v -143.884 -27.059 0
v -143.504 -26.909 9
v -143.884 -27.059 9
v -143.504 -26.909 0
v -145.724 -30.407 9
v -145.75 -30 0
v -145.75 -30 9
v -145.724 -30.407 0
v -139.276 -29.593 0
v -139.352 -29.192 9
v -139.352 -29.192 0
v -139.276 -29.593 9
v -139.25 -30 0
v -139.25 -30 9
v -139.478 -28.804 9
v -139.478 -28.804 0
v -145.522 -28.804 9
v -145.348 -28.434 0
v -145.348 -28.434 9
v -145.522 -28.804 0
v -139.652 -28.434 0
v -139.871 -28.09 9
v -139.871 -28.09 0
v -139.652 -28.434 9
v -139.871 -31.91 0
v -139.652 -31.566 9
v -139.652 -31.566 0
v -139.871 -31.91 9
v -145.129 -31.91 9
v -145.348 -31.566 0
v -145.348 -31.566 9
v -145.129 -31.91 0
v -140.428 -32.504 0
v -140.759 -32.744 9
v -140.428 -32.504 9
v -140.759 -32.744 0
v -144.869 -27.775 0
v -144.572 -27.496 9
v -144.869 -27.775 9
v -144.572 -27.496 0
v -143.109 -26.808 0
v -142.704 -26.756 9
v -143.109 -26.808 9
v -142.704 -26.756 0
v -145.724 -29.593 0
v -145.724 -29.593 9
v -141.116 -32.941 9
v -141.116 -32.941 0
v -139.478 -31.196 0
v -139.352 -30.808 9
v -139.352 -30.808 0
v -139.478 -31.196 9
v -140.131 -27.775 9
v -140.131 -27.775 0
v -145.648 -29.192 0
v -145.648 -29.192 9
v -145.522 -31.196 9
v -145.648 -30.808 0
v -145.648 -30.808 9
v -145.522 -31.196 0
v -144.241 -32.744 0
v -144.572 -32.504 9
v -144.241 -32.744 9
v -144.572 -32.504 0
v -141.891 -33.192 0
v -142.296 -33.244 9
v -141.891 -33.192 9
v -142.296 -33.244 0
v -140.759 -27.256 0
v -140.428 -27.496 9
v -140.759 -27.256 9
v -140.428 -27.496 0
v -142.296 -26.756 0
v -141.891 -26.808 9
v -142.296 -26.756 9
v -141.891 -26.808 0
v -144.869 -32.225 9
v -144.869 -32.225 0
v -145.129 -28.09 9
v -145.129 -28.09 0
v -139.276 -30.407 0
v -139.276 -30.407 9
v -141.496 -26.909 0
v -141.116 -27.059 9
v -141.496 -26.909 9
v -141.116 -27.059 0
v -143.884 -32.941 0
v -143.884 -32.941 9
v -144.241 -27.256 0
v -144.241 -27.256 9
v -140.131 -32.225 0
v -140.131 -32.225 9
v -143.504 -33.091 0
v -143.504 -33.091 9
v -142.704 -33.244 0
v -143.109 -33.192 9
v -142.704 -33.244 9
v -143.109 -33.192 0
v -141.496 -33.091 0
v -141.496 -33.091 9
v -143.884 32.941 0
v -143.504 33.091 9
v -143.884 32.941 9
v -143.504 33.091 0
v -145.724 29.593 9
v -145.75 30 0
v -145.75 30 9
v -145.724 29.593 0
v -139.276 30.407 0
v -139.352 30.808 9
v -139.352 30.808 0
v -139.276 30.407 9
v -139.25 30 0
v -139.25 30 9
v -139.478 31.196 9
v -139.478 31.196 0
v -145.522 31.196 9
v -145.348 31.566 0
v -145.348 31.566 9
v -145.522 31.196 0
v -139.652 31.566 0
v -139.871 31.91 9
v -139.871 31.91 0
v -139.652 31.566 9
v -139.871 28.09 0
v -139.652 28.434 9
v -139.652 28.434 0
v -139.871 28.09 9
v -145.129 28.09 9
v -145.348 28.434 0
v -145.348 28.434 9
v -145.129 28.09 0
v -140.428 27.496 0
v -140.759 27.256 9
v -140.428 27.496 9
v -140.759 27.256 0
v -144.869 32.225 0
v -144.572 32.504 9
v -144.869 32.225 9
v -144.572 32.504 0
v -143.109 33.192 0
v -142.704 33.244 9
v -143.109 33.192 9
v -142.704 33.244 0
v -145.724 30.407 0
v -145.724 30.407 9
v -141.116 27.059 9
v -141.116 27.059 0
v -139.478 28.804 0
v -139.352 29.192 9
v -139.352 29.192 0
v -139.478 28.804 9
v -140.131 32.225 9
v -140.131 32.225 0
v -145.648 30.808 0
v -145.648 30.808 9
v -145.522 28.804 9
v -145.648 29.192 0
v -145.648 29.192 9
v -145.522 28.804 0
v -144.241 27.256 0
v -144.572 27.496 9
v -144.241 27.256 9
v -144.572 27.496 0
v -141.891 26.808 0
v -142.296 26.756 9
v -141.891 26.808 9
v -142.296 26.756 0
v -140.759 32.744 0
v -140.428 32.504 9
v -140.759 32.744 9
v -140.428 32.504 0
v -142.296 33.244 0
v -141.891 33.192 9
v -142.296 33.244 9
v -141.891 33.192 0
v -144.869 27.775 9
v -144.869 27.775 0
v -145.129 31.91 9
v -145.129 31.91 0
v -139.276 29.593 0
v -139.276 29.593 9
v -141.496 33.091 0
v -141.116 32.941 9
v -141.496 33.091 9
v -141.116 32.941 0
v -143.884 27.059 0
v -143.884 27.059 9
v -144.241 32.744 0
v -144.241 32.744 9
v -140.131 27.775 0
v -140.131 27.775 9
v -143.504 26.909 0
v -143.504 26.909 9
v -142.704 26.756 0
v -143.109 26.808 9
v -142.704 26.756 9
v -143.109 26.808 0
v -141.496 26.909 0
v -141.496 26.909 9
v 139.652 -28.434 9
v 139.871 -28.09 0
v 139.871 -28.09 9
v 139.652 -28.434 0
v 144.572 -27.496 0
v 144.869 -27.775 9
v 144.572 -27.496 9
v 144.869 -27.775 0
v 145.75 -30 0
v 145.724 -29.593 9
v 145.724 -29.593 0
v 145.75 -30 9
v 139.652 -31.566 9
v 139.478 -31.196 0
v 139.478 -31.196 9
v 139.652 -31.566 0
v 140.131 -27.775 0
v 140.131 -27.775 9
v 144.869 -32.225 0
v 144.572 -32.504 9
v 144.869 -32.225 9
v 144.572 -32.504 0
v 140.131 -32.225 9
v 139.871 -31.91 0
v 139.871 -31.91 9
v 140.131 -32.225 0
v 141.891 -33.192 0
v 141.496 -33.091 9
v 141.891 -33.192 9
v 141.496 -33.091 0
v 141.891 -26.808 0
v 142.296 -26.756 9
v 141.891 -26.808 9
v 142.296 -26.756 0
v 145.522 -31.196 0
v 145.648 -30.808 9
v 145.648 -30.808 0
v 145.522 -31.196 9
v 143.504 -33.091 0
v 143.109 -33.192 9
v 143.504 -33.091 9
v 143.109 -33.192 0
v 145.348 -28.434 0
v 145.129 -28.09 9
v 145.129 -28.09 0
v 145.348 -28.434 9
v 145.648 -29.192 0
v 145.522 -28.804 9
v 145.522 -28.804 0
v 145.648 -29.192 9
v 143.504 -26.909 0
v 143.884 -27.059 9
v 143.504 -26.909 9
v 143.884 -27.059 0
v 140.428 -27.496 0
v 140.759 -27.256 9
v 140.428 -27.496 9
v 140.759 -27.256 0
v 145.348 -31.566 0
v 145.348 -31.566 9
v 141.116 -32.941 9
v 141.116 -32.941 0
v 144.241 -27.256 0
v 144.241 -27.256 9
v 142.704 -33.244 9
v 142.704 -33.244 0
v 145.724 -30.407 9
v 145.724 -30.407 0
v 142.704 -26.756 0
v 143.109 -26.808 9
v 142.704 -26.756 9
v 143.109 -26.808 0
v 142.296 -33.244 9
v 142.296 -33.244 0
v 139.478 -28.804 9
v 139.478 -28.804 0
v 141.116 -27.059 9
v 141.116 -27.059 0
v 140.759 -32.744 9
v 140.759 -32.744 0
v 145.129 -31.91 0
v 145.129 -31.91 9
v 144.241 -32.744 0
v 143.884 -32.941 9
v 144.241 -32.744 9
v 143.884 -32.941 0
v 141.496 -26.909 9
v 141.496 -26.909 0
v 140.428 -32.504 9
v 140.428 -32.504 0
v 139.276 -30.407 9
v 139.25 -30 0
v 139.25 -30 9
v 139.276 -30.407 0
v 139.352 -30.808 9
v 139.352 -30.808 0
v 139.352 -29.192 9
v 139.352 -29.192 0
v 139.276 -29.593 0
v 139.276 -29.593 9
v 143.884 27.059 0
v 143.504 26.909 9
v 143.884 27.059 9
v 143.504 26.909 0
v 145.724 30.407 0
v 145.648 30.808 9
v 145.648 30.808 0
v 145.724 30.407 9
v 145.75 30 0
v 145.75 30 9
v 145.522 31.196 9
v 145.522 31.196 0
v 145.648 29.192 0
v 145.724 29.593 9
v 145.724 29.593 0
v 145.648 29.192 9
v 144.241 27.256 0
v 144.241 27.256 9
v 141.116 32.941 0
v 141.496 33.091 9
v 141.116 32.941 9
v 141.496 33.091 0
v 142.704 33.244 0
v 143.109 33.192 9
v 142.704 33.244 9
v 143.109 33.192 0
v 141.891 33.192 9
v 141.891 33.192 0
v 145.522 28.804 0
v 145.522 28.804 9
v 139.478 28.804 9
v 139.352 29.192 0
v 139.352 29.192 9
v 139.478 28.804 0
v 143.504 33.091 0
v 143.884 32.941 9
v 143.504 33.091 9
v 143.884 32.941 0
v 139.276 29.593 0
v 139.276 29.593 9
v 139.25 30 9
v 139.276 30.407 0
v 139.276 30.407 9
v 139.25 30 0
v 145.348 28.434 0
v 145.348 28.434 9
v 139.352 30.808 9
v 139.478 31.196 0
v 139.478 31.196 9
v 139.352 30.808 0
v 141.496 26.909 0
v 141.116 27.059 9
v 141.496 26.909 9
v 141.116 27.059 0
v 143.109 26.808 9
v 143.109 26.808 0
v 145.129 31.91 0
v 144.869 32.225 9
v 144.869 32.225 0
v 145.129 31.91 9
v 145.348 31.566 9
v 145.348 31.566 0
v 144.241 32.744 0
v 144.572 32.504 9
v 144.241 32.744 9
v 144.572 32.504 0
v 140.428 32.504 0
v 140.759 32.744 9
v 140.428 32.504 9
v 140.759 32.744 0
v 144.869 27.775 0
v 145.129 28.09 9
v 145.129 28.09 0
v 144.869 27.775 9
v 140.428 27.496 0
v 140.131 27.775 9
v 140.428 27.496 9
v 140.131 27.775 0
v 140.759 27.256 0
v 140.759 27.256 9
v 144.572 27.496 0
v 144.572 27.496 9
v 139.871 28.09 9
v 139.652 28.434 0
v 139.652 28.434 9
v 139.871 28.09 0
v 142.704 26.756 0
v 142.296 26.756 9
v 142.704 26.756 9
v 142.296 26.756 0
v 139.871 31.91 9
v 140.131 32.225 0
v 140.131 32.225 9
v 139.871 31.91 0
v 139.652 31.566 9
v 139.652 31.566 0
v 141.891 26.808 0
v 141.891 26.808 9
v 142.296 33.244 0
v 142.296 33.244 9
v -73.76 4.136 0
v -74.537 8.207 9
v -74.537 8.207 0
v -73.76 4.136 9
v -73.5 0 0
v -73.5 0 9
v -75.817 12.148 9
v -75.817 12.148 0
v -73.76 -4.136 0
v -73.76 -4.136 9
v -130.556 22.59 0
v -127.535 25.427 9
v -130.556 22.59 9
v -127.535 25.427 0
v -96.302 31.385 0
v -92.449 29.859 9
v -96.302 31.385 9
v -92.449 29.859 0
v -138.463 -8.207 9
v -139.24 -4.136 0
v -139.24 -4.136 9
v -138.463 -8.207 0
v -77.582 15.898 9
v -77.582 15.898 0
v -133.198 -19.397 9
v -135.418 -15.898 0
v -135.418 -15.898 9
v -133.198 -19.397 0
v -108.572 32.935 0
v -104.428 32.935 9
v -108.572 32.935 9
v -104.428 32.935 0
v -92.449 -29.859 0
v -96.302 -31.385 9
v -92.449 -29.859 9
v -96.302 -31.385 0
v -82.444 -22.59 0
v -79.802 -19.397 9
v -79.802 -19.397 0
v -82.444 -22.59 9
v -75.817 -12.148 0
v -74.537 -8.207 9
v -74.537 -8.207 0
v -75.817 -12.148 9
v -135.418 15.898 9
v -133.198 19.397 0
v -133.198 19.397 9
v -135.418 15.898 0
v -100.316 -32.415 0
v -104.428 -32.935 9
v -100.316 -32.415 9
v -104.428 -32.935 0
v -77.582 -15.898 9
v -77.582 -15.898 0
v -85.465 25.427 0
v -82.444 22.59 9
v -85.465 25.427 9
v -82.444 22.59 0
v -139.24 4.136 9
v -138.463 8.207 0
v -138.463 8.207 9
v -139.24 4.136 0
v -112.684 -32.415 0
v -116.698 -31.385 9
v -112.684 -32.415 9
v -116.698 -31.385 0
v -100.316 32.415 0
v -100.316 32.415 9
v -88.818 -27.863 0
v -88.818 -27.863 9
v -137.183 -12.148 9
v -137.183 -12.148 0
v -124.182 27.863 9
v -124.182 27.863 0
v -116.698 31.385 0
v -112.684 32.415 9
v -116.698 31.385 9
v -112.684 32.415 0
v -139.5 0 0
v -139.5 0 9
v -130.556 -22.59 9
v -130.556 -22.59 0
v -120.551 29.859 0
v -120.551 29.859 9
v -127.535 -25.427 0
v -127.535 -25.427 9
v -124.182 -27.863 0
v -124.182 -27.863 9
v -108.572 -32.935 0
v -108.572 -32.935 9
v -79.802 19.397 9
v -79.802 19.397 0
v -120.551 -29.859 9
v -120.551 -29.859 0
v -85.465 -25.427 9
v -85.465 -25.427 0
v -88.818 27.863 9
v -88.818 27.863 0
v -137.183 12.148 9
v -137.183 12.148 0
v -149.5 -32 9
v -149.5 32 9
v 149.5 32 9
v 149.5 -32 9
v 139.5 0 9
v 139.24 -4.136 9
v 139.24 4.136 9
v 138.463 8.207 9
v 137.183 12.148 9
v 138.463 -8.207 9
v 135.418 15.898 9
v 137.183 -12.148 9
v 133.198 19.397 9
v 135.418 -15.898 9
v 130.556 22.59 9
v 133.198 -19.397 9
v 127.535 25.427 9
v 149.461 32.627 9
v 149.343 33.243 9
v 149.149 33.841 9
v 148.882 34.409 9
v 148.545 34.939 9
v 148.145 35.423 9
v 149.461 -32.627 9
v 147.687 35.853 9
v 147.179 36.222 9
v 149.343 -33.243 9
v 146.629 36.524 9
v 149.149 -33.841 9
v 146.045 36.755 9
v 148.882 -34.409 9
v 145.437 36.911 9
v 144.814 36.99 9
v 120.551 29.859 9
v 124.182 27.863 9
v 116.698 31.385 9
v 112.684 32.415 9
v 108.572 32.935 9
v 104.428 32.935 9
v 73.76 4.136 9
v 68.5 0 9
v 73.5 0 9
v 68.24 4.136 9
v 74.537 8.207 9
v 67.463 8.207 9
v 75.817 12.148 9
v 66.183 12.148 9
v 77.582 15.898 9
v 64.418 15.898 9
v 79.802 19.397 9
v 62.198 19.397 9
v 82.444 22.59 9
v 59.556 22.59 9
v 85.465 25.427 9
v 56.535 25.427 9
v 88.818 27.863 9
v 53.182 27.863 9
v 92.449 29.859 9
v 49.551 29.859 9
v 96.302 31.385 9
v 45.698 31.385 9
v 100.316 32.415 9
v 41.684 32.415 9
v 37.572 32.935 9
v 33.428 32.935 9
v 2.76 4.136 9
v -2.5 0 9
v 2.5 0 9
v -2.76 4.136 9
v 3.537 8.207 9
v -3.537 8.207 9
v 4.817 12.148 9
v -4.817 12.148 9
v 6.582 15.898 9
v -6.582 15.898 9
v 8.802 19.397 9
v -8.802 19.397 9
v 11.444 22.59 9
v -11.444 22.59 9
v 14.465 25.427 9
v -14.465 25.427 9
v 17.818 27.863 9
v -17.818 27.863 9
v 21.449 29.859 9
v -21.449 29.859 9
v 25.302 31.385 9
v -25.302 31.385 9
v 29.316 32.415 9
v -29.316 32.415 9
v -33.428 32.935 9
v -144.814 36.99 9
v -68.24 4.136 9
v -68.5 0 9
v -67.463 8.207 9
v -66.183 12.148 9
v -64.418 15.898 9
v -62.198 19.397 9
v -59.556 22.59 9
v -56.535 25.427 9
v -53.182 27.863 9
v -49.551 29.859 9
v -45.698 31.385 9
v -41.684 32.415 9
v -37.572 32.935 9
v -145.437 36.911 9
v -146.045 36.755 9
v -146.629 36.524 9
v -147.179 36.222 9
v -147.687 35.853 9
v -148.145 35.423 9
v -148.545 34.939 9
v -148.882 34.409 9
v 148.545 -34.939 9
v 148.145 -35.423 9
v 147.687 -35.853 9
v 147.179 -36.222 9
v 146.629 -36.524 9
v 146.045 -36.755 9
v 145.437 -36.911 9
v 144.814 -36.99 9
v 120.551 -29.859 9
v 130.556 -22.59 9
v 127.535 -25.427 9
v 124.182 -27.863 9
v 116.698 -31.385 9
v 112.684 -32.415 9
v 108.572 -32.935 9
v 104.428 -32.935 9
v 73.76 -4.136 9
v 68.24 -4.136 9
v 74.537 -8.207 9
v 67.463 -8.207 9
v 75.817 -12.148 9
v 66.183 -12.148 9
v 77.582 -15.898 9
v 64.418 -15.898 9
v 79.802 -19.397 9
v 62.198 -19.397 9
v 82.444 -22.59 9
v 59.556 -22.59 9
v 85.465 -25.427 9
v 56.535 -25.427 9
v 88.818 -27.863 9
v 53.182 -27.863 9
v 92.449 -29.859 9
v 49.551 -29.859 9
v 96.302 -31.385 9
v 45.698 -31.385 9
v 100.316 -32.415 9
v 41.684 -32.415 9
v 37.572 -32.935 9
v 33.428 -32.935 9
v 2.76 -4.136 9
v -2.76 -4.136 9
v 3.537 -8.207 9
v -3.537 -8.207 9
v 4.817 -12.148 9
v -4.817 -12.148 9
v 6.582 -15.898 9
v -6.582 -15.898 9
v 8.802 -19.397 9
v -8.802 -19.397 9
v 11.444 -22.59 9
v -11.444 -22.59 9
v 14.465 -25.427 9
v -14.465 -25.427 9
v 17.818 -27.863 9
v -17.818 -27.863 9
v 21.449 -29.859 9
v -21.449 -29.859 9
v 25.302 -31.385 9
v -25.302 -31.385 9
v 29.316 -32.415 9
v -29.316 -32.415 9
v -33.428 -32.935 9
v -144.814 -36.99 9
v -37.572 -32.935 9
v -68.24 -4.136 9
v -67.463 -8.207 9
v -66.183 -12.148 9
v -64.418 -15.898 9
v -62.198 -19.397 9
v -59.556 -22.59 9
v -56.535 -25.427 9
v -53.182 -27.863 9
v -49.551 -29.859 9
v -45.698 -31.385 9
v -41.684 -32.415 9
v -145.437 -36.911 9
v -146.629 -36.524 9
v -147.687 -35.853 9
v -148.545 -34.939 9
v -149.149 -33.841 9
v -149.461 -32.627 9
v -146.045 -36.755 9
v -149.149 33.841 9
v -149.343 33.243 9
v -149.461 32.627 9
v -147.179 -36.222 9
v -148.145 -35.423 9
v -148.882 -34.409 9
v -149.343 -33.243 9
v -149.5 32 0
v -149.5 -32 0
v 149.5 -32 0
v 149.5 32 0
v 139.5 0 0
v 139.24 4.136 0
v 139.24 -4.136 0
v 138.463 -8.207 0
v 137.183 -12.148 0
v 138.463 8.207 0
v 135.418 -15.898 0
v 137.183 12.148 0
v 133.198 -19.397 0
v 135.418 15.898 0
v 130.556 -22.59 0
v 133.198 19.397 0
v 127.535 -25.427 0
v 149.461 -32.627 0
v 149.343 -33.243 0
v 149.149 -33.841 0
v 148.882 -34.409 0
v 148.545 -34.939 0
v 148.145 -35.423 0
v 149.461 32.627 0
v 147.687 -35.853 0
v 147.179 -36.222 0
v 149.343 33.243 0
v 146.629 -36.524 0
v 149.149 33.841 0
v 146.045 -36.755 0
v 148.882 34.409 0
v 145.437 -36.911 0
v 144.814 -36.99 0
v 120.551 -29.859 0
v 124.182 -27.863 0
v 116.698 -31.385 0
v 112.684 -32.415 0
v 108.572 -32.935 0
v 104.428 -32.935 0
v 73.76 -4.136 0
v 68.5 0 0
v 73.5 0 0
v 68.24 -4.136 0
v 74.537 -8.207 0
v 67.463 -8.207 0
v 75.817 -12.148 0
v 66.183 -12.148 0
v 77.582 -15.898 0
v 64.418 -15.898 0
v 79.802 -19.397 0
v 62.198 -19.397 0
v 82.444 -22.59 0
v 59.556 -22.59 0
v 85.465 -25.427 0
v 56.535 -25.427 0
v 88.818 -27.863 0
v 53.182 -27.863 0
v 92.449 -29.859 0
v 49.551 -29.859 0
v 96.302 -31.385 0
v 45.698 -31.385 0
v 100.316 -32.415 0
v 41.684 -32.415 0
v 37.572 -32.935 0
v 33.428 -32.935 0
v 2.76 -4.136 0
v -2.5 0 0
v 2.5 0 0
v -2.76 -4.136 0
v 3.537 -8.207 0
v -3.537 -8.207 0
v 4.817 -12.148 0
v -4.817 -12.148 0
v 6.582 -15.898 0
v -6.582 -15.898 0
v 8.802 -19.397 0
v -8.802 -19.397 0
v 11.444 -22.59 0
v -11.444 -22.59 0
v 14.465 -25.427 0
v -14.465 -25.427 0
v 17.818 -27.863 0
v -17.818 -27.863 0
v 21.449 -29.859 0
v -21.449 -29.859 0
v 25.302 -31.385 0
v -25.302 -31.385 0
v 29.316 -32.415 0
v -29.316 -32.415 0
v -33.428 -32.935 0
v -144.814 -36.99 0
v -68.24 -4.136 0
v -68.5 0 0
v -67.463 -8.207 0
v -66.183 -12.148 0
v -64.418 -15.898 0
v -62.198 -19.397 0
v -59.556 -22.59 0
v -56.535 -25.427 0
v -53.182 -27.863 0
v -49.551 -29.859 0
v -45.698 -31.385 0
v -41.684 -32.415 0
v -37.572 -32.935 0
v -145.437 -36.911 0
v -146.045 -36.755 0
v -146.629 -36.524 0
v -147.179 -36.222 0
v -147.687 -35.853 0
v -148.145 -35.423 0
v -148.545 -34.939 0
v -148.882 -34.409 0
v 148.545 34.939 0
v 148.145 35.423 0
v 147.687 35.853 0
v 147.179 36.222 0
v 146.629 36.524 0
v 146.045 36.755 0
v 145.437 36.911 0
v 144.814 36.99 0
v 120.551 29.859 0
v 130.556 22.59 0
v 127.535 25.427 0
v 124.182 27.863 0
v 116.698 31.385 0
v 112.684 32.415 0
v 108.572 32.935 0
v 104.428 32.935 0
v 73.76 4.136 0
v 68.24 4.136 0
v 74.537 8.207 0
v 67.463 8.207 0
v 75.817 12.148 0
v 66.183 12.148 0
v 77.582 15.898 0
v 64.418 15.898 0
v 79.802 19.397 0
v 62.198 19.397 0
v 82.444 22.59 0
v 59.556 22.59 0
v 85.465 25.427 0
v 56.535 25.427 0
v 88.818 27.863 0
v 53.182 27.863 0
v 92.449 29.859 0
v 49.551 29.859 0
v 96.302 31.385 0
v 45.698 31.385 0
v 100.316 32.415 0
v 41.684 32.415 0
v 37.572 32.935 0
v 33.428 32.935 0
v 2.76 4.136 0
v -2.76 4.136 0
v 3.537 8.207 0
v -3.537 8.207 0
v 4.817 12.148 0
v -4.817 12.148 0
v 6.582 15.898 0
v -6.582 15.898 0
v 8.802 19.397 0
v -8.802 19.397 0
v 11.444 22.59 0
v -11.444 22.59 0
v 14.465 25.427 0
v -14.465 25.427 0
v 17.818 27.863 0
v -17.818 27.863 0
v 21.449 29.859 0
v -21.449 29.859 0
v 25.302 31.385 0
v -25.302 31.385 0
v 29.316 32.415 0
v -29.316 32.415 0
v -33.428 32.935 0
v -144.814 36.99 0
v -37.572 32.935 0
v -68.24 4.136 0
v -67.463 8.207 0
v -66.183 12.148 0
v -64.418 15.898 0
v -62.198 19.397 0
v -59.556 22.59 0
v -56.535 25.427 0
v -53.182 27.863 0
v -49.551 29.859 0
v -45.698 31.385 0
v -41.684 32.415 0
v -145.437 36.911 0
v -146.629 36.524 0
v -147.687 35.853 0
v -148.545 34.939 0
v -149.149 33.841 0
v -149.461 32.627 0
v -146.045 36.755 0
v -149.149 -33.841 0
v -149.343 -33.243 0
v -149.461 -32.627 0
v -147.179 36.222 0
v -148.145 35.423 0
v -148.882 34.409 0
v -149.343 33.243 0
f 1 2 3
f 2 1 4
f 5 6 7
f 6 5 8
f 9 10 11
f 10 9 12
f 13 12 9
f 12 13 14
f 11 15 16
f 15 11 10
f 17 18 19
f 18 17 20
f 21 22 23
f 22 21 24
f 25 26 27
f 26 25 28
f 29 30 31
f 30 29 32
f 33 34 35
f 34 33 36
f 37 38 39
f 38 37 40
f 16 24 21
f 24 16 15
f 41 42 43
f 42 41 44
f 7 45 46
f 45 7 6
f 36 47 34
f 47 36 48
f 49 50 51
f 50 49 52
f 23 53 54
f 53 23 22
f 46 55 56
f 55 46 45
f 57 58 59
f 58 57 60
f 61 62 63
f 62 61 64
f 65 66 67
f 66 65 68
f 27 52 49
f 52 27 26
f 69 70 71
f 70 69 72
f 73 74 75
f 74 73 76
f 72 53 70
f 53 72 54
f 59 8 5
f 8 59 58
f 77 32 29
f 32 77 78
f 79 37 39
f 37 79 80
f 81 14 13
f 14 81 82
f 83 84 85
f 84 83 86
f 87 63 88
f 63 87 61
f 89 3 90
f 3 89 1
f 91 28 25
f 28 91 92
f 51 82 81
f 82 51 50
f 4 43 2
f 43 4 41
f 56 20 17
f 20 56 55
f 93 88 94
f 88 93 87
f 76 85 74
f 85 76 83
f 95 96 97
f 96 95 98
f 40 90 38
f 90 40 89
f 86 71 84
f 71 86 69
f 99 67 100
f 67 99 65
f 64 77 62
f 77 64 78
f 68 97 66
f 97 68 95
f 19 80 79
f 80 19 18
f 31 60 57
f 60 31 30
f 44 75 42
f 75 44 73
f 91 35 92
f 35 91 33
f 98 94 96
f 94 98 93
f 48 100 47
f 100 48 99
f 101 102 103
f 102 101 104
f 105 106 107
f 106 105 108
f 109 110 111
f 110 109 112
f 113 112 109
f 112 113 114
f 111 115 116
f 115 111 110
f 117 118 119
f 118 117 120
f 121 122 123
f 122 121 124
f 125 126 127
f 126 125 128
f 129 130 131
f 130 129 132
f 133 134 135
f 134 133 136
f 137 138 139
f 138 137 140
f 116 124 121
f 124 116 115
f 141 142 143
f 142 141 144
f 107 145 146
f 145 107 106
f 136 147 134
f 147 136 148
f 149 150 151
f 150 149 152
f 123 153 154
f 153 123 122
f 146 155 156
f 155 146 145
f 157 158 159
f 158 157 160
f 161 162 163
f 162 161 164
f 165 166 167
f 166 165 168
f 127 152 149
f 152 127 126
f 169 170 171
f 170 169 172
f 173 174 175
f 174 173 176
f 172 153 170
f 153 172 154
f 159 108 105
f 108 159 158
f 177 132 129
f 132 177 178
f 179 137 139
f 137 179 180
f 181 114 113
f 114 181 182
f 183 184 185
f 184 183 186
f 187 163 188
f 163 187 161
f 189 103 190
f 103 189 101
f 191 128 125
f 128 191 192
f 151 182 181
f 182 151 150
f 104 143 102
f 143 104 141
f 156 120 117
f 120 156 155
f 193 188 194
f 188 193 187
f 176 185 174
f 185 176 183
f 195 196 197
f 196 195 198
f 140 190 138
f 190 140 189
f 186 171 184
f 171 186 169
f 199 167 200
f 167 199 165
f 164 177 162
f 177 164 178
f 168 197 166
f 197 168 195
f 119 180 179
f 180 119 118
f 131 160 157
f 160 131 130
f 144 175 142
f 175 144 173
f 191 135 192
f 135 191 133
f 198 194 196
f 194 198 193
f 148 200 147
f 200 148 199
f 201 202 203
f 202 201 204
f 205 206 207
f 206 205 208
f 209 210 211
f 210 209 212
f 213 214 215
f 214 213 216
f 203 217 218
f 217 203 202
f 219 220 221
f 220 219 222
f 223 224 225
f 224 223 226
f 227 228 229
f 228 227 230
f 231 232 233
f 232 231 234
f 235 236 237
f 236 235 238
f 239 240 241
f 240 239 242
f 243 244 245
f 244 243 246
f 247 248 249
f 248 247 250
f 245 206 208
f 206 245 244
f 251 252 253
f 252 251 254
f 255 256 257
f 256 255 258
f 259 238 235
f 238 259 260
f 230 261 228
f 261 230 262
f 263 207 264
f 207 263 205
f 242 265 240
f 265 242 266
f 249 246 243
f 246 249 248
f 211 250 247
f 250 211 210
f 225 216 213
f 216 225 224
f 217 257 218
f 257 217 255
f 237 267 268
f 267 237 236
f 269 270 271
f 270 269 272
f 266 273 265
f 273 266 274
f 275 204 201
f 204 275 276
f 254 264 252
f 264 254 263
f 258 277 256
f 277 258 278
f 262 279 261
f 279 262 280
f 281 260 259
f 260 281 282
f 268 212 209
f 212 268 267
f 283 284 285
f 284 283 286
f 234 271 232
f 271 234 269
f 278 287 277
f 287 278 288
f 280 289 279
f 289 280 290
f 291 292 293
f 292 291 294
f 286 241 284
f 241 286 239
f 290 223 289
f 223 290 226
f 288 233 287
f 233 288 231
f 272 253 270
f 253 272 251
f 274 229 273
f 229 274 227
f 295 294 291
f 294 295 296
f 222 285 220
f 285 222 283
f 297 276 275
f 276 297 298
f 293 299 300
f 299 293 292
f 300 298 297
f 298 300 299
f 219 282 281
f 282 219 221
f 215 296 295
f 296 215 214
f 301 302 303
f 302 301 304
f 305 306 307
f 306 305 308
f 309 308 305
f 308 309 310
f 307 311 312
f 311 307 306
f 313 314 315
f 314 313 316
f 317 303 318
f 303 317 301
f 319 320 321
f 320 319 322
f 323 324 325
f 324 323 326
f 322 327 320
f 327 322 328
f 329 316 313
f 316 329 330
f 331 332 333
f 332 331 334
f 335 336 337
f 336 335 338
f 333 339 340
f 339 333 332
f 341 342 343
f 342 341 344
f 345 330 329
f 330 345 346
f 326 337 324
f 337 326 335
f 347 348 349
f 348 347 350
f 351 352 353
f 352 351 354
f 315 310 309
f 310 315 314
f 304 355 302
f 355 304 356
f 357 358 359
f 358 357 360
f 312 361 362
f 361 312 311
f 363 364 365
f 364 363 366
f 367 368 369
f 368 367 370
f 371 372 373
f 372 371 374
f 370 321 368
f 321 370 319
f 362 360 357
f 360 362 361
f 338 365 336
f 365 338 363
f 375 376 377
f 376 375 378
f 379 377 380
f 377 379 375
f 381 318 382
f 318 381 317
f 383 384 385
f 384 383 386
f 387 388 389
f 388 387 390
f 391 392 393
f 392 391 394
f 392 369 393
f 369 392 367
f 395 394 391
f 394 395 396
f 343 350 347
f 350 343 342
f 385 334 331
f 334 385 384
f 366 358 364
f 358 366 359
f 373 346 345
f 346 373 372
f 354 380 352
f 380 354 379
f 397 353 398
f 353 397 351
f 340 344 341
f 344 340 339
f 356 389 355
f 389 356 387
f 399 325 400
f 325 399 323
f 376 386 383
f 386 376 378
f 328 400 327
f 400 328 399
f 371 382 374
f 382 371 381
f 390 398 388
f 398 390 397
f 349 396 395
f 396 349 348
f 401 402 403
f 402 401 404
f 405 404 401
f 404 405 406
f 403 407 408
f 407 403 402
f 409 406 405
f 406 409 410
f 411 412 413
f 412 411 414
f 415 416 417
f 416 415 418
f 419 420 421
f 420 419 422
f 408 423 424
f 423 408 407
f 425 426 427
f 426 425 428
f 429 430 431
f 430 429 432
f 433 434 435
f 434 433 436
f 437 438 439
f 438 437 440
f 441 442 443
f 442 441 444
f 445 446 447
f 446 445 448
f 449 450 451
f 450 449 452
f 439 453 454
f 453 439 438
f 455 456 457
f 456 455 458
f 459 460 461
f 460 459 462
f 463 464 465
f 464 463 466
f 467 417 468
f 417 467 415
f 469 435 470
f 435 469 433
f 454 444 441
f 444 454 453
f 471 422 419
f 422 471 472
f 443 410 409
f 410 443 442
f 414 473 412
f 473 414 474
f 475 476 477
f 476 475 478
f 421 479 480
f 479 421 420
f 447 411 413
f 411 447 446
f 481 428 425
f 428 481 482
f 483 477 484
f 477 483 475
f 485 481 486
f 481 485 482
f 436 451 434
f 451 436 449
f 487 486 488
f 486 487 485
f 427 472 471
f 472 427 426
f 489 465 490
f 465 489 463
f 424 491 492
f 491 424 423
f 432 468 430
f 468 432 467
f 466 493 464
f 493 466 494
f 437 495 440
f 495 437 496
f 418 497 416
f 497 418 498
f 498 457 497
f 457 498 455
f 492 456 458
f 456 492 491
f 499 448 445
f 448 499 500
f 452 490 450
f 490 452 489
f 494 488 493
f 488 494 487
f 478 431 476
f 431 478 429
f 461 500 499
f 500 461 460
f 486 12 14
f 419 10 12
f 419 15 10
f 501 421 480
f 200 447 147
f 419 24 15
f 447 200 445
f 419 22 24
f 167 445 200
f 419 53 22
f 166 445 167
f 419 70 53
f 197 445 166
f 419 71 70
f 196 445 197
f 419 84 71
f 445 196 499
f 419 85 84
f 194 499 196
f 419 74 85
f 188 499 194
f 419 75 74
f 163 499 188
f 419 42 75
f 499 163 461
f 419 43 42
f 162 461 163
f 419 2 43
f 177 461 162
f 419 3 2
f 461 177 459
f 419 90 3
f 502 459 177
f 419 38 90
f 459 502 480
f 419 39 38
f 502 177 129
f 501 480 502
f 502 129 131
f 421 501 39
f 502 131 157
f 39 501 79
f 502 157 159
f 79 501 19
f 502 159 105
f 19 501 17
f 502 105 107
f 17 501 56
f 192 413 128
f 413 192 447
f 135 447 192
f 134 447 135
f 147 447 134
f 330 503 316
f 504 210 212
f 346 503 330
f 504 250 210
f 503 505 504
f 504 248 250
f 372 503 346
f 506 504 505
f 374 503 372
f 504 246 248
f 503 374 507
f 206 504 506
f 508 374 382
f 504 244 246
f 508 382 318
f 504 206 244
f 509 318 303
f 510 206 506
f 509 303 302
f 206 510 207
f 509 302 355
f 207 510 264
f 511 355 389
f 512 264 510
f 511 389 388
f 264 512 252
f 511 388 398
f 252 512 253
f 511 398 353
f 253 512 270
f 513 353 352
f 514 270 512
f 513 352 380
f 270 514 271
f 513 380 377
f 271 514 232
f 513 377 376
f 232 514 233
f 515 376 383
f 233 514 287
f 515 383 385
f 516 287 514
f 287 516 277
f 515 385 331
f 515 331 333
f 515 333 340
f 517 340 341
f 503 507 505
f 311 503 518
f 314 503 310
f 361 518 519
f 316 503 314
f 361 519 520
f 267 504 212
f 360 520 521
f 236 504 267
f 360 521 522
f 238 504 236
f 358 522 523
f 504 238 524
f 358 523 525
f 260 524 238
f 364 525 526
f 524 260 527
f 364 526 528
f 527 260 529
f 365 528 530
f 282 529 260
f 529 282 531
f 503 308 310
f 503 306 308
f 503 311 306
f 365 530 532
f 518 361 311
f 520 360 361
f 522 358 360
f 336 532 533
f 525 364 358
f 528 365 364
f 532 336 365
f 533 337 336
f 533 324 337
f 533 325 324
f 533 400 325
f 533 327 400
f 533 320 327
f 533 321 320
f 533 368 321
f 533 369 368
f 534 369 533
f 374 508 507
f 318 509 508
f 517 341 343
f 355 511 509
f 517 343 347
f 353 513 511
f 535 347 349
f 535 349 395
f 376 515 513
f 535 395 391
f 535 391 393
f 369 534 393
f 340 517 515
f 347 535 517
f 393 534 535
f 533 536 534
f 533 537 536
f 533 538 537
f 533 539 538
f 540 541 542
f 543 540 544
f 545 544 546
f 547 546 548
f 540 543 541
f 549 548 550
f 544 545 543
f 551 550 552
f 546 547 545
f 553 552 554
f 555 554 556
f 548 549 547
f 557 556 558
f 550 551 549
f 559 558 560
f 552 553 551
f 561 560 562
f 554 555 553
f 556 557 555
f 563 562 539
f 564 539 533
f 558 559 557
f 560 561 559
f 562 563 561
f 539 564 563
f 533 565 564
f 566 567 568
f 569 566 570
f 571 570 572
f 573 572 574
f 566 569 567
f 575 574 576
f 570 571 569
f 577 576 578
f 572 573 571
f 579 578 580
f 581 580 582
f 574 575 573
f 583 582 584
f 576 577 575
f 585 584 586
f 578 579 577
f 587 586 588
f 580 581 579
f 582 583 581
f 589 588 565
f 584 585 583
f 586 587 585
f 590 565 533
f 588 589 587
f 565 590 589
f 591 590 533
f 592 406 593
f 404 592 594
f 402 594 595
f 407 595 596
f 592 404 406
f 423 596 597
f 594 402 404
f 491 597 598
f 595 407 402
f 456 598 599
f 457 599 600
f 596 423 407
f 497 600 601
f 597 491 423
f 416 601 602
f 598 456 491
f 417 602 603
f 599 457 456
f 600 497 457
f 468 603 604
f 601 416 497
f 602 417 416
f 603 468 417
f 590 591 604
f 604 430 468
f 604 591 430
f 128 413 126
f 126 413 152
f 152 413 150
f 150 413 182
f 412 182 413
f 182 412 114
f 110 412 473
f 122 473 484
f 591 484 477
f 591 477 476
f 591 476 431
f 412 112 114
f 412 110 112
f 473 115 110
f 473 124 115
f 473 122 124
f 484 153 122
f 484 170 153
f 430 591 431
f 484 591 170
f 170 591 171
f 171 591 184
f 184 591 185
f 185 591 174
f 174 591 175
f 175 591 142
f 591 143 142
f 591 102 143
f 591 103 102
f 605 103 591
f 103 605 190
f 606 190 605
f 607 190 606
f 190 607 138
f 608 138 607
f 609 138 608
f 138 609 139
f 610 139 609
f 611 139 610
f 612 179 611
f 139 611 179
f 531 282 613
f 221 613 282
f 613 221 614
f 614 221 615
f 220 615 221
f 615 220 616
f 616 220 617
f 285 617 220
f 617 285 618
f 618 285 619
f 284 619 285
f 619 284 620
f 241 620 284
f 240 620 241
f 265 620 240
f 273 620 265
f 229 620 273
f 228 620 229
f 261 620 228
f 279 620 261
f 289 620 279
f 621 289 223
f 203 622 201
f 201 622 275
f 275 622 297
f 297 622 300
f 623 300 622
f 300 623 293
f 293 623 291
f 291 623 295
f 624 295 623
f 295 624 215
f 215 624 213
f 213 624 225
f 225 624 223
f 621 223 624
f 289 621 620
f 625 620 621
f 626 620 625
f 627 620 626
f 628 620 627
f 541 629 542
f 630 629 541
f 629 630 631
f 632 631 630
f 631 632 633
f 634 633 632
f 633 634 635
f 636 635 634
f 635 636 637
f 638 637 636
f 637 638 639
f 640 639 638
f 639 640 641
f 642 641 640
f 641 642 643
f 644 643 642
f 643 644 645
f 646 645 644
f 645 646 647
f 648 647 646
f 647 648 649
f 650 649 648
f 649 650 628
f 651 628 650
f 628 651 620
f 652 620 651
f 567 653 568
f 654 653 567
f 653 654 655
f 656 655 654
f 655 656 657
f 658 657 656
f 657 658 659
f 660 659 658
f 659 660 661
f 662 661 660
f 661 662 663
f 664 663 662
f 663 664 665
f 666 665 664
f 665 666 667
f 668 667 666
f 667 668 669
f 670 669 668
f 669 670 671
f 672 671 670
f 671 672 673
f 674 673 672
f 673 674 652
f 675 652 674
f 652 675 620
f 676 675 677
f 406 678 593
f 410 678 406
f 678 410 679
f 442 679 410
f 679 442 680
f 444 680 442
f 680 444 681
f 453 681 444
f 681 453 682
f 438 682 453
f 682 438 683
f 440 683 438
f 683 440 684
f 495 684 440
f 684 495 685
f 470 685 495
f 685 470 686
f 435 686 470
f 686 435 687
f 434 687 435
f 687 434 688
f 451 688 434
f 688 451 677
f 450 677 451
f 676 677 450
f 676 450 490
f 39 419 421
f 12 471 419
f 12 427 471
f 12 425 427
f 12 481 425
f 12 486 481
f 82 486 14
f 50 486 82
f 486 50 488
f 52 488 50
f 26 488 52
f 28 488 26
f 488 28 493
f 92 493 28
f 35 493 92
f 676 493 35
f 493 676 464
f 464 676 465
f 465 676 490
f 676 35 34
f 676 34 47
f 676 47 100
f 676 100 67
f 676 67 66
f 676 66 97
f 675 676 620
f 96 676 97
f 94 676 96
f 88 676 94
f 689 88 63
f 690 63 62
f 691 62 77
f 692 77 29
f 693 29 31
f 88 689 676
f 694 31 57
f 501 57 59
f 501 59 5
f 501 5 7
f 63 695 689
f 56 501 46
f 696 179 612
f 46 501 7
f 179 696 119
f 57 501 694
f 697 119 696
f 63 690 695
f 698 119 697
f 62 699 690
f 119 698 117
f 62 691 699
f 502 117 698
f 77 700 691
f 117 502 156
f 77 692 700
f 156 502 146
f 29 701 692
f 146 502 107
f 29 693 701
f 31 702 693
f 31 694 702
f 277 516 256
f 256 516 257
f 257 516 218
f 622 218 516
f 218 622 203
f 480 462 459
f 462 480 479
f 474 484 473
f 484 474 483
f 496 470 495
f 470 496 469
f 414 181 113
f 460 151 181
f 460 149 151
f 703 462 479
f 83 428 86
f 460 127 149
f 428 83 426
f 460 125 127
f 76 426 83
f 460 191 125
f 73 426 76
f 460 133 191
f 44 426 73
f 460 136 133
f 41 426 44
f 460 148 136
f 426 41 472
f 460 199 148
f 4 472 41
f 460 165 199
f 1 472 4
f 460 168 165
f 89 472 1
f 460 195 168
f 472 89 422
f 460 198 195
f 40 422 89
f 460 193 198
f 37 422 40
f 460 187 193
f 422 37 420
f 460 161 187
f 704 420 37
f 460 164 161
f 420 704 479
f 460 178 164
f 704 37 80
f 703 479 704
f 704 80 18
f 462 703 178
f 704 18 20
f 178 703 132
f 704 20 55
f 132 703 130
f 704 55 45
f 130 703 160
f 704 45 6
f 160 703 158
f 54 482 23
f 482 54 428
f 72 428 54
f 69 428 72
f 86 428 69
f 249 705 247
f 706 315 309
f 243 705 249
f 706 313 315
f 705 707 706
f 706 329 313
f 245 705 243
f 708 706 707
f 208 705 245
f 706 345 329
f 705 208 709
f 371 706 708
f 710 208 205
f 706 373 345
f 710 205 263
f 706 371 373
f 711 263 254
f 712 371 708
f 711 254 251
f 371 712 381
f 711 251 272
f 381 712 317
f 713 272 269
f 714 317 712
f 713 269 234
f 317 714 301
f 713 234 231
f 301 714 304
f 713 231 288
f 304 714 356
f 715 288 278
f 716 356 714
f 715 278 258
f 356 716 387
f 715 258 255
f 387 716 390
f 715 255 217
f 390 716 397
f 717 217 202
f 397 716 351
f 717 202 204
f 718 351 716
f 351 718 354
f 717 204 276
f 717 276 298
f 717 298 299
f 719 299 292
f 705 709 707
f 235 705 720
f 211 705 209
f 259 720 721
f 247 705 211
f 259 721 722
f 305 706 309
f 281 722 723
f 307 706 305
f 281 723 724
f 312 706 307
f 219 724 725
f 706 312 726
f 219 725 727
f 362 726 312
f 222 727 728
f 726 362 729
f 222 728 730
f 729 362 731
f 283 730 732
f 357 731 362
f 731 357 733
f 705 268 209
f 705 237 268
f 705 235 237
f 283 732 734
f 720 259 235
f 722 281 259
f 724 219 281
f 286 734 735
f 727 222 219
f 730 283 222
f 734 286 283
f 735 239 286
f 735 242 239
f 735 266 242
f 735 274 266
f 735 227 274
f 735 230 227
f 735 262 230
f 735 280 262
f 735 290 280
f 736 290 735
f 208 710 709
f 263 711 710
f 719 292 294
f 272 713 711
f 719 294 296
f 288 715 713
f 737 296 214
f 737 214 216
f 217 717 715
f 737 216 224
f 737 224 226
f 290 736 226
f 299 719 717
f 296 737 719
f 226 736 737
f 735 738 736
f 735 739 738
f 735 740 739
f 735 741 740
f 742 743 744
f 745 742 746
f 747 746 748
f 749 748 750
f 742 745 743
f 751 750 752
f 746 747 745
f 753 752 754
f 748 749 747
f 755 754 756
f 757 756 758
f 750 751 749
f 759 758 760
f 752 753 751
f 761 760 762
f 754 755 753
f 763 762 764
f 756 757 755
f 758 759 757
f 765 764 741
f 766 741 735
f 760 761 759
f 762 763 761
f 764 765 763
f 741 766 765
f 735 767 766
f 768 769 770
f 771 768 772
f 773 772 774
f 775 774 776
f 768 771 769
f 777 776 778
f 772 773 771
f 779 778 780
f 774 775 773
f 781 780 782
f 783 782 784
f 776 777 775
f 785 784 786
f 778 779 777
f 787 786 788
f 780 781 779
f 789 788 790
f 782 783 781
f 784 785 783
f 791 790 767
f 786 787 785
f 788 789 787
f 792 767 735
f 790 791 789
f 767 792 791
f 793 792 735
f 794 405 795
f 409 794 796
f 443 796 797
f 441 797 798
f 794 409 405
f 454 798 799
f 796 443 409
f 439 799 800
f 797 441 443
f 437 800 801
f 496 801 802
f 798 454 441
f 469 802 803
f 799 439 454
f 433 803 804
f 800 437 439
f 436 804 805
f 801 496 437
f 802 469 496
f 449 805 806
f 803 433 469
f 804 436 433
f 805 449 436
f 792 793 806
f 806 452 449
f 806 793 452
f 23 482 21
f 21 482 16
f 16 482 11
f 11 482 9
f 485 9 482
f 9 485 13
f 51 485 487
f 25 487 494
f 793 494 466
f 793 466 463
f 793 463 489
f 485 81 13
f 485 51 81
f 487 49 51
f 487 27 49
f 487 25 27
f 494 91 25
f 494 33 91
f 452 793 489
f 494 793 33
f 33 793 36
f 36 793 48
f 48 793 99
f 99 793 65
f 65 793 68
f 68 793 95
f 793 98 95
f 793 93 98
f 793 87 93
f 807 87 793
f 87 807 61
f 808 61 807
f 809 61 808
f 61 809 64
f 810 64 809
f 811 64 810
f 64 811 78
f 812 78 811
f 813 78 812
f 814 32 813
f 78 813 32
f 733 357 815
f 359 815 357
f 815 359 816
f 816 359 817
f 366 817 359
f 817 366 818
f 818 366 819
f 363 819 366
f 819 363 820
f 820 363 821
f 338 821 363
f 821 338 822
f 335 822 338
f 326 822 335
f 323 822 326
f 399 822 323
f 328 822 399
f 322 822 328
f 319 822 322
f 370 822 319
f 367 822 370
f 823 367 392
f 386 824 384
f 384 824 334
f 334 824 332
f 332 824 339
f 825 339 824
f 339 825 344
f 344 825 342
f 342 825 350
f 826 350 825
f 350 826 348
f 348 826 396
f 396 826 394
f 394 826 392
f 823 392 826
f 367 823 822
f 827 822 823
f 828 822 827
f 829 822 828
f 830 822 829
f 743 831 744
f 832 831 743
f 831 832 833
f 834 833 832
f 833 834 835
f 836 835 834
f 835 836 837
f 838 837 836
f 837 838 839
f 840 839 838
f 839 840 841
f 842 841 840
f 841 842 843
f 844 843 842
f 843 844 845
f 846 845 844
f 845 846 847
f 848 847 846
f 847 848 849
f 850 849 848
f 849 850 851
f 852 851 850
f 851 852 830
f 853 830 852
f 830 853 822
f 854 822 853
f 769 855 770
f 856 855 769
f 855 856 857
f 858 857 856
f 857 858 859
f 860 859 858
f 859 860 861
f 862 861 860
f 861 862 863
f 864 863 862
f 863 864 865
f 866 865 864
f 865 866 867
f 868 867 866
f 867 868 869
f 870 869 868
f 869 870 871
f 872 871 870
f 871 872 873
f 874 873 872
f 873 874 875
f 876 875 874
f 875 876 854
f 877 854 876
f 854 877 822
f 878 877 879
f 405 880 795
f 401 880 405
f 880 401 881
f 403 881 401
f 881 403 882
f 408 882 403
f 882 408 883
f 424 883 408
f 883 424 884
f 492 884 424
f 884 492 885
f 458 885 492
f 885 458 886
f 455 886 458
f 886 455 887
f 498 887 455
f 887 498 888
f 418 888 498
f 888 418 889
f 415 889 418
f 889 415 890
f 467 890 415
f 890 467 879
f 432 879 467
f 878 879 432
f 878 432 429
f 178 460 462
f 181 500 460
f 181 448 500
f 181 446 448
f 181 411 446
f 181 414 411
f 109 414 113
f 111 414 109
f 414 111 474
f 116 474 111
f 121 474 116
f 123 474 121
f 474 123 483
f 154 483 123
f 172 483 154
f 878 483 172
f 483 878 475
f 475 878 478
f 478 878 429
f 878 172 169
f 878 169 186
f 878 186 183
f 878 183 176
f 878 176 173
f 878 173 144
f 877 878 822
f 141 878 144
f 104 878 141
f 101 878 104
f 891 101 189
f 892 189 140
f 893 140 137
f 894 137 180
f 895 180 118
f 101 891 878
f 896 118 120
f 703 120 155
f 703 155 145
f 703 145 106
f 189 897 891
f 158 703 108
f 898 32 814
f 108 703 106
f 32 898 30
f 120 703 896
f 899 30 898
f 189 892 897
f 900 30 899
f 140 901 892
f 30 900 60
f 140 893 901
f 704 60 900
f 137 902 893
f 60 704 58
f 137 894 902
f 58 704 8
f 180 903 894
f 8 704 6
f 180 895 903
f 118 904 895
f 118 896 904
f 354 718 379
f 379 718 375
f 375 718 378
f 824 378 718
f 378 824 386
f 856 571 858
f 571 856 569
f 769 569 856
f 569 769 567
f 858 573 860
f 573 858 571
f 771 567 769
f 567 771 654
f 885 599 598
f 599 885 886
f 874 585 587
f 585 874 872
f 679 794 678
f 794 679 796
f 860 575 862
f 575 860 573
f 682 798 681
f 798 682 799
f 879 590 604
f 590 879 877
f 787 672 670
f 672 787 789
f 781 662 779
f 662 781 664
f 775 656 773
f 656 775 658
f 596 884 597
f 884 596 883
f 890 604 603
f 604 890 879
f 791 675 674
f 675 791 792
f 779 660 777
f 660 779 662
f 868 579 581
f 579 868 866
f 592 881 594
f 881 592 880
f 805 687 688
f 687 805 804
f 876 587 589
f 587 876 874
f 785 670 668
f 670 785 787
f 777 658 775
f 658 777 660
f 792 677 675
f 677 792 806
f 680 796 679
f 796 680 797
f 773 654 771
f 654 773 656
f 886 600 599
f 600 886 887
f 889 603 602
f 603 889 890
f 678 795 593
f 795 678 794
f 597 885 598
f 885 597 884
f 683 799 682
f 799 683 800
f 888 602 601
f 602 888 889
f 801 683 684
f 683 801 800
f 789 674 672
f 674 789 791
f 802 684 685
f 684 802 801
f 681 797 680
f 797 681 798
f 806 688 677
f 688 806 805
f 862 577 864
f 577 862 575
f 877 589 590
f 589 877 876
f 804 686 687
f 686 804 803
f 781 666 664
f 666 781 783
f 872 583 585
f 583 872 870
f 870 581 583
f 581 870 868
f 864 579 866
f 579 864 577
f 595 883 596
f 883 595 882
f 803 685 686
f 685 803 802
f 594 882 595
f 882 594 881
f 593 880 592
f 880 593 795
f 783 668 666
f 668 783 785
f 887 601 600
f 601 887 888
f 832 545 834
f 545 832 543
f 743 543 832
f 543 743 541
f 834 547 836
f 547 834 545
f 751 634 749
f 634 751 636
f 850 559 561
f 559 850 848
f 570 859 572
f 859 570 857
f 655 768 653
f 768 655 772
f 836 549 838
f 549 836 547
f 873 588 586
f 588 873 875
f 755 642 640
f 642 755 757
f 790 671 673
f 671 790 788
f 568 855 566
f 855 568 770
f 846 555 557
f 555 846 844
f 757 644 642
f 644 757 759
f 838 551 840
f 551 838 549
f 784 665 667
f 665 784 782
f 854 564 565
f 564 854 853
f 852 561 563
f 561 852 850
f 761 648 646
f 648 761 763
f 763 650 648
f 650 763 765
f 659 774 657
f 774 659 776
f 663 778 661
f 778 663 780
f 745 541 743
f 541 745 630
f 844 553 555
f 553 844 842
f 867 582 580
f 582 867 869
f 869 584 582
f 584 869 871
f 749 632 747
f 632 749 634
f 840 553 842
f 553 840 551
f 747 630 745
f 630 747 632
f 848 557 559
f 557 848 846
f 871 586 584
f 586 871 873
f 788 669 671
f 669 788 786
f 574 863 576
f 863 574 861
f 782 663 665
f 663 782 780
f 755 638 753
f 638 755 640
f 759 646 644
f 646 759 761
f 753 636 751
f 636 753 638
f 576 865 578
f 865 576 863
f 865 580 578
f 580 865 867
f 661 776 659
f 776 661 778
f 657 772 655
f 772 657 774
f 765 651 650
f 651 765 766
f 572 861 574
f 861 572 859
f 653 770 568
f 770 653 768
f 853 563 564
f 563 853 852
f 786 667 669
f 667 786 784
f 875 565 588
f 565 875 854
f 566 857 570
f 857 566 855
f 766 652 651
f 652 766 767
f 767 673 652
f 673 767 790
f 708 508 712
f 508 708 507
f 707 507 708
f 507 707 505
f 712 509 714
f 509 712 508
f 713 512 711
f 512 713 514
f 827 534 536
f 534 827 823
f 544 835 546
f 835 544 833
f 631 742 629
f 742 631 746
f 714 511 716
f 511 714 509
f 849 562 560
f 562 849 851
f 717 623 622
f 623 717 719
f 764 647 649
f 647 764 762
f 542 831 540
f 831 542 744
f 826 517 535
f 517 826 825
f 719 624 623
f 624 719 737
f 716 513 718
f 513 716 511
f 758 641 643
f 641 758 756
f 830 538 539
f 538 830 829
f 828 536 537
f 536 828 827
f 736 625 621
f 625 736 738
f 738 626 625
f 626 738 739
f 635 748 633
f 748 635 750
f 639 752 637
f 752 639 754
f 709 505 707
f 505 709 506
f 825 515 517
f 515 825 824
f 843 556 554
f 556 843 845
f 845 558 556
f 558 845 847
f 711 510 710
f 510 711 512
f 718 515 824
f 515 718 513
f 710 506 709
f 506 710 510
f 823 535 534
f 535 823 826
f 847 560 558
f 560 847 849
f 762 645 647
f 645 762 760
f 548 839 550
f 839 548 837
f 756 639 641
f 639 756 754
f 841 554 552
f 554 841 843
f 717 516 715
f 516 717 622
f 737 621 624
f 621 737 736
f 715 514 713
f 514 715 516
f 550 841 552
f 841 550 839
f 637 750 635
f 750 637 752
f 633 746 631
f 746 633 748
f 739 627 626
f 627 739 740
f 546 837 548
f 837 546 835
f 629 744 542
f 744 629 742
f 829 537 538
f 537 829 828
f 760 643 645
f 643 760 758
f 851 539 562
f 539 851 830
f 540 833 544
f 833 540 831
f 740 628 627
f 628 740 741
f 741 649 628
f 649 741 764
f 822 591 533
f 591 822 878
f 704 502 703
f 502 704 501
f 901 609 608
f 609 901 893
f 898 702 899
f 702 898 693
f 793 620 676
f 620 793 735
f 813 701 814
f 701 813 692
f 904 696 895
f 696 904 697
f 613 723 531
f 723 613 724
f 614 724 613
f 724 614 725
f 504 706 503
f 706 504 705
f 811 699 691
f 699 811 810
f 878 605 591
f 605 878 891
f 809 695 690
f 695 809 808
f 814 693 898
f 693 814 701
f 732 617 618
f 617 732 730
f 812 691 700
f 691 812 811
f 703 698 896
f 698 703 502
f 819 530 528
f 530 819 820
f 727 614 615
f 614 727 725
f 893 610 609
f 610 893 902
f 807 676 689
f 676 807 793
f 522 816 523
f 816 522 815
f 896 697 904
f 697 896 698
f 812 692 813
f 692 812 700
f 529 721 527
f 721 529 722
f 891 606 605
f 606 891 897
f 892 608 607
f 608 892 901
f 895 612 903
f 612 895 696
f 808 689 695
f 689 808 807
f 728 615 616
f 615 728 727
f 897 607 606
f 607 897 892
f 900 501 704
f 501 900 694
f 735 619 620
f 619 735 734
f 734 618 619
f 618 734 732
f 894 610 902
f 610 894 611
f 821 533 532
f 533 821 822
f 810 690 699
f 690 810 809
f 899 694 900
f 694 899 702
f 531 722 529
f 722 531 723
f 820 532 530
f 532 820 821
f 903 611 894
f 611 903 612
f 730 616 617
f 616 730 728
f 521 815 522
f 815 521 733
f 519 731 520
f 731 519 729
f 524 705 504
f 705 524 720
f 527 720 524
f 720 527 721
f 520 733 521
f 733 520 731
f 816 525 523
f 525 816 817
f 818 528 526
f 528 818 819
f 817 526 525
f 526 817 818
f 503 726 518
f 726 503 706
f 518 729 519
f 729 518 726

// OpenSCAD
$fn = 50;


difference() {
	union() {
		hull() {
			translate(v = [-144.5000000000, 32.0000000000, 0]) {
				cylinder(h = 9, r = 5);
			}
			translate(v = [144.5000000000, 32.0000000000, 0]) {
				cylinder(h = 9, r = 5);
			}
			translate(v = [-144.5000000000, -32.0000000000, 0]) {
				cylinder(h = 9, r = 5);
			}
			translate(v = [144.5000000000, -32.0000000000, 0]) {
				cylinder(h = 9, r = 5);
			}
		}
	}
	union() {
		#translate(v = [-142.5000000000, -30.0000000000, -100.0000000000]) {
			cylinder(h = 200, r = 3.2500000000);
		}
		#translate(v = [-142.5000000000, 30.0000000000, -100.0000000000]) {
			cylinder(h = 200, r = 3.2500000000);
		}
		#translate(v = [142.5000000000, -30.0000000000, -100.0000000000]) {
			cylinder(h = 200, r = 3.2500000000);
		}
		#translate(v = [142.5000000000, 30.0000000000, -100.0000000000]) {
			cylinder(h = 200, r = 3.2500000000);
		}
		#translate(v = [-106.5000000000, 0, 0]) {
			cylinder(h = 9, r = 33.0000000000);
		}
		#translate(v = [-35.5000000000, 0, 0]) {
			cylinder(h = 9, r = 33.0000000000);
		}
		#translate(v = [35.5000000000, 0, 0]) {
			cylinder(h = 9, r = 33.0000000000);
		}
		#translate(v = [106.5000000000, 0, 0]) {
			cylinder(h = 9, r = 33.0000000000);
		}
	}
}
